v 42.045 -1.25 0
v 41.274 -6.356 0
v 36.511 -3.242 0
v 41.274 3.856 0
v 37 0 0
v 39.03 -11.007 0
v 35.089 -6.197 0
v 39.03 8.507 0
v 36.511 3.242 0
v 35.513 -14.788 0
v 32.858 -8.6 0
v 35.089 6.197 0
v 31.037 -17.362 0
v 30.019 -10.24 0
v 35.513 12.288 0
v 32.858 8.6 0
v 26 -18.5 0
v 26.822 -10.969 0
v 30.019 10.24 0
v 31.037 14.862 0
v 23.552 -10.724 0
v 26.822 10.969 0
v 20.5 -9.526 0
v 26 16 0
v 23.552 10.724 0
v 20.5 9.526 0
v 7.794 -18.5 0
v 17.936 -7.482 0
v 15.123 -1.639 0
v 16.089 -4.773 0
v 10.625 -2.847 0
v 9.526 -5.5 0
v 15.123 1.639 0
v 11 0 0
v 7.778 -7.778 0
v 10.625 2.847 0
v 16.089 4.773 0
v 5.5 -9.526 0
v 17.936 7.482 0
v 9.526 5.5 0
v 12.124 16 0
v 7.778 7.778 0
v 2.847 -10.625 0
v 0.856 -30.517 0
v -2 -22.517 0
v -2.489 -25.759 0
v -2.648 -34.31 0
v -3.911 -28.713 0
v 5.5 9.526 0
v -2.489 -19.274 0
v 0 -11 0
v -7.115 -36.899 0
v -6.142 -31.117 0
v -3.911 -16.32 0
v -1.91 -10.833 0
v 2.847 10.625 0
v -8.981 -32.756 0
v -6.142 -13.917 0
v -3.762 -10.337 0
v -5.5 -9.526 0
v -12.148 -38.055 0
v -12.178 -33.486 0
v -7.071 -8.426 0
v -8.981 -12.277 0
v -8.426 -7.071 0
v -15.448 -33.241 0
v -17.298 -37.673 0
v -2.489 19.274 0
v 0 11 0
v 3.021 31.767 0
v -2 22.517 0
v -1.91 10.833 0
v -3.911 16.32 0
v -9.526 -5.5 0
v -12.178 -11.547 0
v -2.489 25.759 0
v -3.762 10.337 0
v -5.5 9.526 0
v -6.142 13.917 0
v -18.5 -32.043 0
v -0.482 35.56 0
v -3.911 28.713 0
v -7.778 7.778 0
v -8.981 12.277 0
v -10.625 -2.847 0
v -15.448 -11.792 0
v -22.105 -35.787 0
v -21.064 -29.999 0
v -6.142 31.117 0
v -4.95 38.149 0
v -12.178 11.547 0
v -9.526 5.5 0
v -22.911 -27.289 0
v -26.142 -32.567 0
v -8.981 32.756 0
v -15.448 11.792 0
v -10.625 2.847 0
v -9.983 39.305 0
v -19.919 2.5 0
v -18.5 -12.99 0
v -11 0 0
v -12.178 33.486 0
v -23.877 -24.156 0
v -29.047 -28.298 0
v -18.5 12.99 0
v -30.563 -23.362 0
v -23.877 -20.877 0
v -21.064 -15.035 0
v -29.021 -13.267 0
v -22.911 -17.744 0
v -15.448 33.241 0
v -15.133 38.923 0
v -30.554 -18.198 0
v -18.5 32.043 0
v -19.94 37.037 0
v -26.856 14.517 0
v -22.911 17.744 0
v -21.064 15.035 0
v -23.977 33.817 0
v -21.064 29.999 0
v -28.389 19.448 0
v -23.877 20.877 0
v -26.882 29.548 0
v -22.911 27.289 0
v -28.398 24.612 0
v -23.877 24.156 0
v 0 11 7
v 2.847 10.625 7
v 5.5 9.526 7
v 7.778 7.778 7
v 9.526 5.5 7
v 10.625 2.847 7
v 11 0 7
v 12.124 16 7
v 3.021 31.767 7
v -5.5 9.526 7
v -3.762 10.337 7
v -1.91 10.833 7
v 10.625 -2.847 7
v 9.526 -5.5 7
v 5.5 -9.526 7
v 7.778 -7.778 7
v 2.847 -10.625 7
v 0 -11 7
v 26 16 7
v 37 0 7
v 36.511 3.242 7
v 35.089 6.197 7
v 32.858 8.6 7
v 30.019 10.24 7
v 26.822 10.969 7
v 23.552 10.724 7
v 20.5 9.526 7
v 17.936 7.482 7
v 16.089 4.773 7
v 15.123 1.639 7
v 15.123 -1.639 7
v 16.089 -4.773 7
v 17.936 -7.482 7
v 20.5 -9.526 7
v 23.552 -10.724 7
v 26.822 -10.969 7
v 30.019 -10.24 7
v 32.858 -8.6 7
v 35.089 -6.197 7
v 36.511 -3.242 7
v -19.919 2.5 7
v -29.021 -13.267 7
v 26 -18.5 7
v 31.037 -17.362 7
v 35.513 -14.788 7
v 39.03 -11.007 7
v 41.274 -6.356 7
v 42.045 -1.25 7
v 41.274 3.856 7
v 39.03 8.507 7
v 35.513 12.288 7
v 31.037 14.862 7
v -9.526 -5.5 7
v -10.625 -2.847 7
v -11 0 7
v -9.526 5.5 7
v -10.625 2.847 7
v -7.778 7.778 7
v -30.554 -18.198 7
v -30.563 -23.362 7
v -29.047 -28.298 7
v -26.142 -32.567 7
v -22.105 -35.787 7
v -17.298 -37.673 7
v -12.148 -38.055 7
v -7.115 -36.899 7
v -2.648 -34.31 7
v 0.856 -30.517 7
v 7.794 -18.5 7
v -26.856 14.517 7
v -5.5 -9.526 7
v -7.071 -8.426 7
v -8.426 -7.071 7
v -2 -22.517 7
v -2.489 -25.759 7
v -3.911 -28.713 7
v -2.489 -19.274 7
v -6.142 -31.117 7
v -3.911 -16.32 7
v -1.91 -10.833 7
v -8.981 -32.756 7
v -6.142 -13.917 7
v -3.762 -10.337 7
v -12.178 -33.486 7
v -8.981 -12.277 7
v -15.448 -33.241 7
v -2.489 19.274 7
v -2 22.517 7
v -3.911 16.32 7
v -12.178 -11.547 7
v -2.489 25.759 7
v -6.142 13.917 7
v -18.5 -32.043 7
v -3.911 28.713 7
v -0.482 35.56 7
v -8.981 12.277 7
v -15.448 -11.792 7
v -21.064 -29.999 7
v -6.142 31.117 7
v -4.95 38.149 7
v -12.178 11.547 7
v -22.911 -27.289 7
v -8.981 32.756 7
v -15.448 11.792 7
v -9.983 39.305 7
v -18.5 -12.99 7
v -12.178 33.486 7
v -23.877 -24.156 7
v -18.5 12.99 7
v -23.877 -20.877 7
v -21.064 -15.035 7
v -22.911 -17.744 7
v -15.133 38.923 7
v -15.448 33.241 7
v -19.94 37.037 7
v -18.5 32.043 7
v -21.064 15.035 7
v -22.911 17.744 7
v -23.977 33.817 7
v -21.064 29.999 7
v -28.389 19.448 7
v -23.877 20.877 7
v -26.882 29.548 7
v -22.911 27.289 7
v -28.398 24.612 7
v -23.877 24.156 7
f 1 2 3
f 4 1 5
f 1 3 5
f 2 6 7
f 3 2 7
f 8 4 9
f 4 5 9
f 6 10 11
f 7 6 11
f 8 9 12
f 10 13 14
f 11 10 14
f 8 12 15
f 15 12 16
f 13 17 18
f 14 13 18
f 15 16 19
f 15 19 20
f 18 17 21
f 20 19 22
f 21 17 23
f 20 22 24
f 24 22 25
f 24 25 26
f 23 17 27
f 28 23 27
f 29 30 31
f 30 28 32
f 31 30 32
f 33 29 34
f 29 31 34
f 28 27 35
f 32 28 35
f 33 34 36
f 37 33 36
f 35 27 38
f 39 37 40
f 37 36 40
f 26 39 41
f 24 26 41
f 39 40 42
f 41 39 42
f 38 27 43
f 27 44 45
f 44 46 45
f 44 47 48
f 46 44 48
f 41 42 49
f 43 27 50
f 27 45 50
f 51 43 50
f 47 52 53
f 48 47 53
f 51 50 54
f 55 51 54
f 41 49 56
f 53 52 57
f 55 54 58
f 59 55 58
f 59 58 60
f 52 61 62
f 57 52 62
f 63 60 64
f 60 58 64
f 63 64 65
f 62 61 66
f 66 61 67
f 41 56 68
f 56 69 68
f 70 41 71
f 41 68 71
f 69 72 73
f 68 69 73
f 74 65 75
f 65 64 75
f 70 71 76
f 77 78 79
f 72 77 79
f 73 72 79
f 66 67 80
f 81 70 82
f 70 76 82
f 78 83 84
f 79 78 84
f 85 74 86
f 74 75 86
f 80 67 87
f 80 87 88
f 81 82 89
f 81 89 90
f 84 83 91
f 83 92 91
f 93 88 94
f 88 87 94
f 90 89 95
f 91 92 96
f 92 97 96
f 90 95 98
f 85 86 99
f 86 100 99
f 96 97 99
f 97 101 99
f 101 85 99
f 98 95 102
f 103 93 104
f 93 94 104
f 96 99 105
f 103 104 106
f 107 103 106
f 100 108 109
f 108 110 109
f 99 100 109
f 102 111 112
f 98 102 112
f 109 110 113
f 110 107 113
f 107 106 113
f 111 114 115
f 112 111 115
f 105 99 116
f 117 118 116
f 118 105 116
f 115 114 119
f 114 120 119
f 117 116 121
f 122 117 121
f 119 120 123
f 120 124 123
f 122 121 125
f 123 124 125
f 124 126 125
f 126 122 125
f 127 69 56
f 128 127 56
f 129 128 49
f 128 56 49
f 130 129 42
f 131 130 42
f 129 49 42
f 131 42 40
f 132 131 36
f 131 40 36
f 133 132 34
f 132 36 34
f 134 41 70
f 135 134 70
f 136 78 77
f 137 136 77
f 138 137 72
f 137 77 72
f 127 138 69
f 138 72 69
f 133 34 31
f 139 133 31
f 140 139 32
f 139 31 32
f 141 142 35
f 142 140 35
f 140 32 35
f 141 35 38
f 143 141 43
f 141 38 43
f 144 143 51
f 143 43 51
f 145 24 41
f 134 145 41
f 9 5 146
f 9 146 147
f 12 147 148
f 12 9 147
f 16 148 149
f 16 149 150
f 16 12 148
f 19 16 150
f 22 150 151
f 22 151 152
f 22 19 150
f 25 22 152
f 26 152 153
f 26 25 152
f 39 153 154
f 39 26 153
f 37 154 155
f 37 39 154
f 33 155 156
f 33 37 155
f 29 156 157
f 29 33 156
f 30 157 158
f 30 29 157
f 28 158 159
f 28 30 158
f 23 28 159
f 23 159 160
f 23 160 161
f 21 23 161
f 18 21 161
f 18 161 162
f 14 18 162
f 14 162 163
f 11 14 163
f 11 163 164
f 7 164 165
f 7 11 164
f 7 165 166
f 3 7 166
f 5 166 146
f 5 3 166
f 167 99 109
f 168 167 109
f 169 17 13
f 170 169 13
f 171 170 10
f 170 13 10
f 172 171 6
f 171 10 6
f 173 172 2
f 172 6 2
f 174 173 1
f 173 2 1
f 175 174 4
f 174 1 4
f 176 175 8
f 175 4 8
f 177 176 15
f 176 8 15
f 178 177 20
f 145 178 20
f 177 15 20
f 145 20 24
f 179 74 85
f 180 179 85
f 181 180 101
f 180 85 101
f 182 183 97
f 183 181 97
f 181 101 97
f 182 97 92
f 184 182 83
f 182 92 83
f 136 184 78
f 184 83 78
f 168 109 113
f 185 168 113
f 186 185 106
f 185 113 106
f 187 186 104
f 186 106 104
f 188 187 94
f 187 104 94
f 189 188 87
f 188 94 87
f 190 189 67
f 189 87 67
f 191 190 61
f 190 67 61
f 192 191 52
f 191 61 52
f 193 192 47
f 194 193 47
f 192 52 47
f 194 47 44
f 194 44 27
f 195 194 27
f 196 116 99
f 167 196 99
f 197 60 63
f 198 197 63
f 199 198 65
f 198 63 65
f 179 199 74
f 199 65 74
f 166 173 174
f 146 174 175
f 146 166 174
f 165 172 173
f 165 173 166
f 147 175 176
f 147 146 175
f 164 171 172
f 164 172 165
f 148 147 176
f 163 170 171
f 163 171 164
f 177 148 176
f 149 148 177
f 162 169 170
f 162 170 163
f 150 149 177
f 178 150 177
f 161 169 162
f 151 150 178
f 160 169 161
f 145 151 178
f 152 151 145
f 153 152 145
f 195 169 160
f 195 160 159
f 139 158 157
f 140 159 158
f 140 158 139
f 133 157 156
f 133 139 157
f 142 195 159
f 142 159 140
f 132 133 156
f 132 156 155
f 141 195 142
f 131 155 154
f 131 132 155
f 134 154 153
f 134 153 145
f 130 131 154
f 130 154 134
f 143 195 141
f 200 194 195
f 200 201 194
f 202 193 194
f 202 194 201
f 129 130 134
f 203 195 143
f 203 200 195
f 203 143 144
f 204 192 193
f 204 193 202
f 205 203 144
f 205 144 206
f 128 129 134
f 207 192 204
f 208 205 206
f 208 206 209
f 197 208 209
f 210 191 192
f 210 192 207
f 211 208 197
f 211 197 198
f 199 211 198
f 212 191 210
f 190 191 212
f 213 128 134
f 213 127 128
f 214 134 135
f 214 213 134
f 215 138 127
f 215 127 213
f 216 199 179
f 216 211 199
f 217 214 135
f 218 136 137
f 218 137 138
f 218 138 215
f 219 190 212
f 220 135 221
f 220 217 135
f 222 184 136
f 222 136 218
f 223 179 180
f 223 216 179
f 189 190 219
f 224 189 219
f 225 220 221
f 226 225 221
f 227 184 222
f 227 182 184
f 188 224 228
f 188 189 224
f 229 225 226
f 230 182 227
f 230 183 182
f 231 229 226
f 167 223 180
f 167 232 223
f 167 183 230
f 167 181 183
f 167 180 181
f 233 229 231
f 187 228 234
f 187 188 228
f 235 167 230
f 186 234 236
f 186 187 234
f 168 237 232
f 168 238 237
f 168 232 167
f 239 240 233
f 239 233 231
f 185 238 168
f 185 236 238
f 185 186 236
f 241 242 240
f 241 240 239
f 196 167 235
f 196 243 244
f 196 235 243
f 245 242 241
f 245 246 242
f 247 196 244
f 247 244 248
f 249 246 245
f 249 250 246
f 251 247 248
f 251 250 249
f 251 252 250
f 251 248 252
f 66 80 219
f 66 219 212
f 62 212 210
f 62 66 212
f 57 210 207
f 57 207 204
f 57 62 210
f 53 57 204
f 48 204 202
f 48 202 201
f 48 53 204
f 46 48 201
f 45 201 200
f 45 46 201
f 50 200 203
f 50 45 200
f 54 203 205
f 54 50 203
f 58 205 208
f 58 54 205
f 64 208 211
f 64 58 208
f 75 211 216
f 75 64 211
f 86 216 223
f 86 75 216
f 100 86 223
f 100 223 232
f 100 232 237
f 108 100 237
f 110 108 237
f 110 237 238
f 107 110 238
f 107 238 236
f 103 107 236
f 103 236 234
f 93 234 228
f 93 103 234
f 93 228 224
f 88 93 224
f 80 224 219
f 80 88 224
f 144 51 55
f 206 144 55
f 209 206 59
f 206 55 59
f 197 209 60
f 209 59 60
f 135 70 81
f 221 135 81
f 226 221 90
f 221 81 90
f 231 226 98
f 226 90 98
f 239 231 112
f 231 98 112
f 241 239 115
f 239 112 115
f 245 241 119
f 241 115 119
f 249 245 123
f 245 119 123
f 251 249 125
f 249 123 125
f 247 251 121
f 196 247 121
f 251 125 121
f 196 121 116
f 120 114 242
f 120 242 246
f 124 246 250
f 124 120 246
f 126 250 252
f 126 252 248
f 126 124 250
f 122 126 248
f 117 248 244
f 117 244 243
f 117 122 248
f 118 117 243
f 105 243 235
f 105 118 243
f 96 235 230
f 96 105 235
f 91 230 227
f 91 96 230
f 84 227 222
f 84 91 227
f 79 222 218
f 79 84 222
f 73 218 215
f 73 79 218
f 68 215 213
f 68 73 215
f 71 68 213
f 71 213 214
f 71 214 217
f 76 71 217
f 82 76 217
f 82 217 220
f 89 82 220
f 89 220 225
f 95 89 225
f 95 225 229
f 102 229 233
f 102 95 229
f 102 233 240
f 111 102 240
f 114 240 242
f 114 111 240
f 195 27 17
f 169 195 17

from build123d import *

# Parameters (mm, degrees)
F0_R            = 11
F1_DEPTH        = 7
F1_COPIES_COUNT = 3


# Not quite as in the source:
# - a pattern or mirror of a feature is missing from the dataset's text; its kind, count and spacing are read off the source's solid


with BuildPart() as f1:
    # F0 (on Top) → F1 (new body)
    with BuildSketch(Plane.XY):
        with BuildLine():
            ThreePointArc((0, 11), (7.7781745931, 7.7781745931), (11, 0))
            ThreePointArc((11, 0), (7.7781745931, -7.7781745931), (0, -11))
            Line((0, -11), (0, -18.5))
            Line((0, -18.5), (26, -18.5))
            ThreePointArc((26, -18.5), (42.0452305564, -1.25), (26, 16))
            Line((26, 16), (0, 16))
            Line((0, 16), (0, 11))
        make_face()
        with Locations((26, 0)):
            Circle(F0_R, mode=Mode.SUBTRACT)
    extrude(amount=F1_DEPTH)

    # F1_copies: F1 ×3 about axis
    f1_copies_axis = Axis((0, 0, 0), (0, 0, 1))


with BuildPart() as f1_1:
    add(f1.part)
    for i in range(1, F1_COPIES_COUNT):
        add(f1.part.rotate(f1_copies_axis, i * 360 / F1_COPIES_COUNT))


solid = f1_1.part
